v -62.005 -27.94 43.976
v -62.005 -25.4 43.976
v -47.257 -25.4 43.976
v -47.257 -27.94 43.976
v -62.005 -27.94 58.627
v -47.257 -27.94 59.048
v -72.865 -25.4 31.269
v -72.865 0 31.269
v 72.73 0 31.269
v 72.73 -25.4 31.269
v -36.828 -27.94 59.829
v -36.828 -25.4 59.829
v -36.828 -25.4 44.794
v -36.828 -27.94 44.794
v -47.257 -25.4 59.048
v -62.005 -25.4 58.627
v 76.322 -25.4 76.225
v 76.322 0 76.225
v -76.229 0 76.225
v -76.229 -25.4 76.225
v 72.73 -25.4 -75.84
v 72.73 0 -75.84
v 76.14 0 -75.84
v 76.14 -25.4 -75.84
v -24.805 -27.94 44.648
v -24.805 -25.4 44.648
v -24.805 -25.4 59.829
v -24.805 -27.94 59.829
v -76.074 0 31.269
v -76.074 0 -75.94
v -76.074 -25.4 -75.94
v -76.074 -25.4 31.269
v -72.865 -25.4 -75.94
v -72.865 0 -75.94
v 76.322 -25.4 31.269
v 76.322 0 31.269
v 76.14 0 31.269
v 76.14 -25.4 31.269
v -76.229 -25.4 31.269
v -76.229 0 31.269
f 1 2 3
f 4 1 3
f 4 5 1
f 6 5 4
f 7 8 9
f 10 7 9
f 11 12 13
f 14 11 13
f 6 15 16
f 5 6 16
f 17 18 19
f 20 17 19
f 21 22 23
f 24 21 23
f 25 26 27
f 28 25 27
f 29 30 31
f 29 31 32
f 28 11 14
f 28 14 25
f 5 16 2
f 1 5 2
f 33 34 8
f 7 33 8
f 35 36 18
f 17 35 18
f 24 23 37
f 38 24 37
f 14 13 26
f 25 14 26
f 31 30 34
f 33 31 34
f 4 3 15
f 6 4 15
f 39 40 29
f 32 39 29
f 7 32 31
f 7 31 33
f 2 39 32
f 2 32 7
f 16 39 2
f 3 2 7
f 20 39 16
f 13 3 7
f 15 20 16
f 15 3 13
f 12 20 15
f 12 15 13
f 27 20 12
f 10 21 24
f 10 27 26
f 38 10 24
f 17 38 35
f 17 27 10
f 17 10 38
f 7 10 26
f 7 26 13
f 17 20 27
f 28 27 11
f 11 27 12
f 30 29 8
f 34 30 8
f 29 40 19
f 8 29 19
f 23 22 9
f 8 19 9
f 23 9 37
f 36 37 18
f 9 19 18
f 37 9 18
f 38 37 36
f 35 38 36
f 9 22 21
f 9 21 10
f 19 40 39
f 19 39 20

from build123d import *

# Parameters (mm, degrees)
F0_W     = 0.1549944282
F0_H     = 44.9563041329
F0_W_2   = 3.2087042928
F0_W_3   = 145.5950886011
F0_H_2   = 107.2087809443
F0_W_4   = 3.4092515707
F0_W_5   = 0.1821219921
F0_H_3   = 107.1085110307
F1_DEPTH = 25.4
F3_DEPTH = 2.54


with BuildPart() as f1:
    # F0 (on Front) → F1 (new body)
    with BuildSketch(Plane.XZ):
        with Locations((-76.1510320008, 53.7468977273)):
            Rectangle(F0_W, F0_H)
        with Locations((-74.4691826403, 53.7468977273)):
            Rectangle(F0_W_2, F0_H)
        with Locations((-0.0672861934, 53.7468977273)):
            Rectangle(F0_W_3, F0_H)
        with Locations((-74.4691826403, -22.3356448114)):
            Rectangle(F0_W_2, F0_H_2)
        with Locations((74.4348838925, 53.7468977273)):
            Rectangle(F0_W_4, F0_H)
        with Locations((76.2305706739, 53.7468977273)):
            Rectangle(F0_W_5, F0_H)
        with Locations((74.4348838925, -22.2855098546)):
            Rectangle(F0_W_4, F0_H_3)
    extrude(amount=F1_DEPTH)

    # F2 (on face) → F3 (join)
    with BuildSketch(Plane.XZ.offset(25.4)):
        Polygon((-36.8280895054, 59.82850492), (-36.8280895054, 44.7937846184), (-24.8050373048, 44.6476303041), (-24.8050373048, 59.82850492), align=None)
        Polygon((-47.2566857934, 59.0478740633), (-62.004558742, 58.6273260415), (-62.004558742, 43.9759418368), (-47.2566857934, 43.9759418368), align=None)
    extrude(amount=F3_DEPTH)


solid = f1.part
